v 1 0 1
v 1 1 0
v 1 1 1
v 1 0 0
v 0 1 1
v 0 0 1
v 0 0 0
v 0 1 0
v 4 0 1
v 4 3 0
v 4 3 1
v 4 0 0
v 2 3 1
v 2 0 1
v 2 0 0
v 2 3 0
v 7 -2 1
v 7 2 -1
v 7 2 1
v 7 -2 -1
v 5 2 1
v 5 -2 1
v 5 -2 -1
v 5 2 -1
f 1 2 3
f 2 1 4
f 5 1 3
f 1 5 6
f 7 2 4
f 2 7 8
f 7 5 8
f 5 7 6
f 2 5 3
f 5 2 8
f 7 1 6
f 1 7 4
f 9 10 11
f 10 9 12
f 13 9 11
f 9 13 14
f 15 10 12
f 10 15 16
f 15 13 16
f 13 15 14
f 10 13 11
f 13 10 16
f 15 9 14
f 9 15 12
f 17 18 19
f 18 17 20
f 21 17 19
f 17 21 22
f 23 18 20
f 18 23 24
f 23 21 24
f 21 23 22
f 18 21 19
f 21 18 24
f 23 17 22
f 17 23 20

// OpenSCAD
cube();
cube([1,1,0]); cube([1,0,1]); cube([0,1,1]); cube([0,0,0]);
translate([2,0,0]) cube([2,3,1]);
translate([6,0,0]) cube([2,4,2], center=true);
